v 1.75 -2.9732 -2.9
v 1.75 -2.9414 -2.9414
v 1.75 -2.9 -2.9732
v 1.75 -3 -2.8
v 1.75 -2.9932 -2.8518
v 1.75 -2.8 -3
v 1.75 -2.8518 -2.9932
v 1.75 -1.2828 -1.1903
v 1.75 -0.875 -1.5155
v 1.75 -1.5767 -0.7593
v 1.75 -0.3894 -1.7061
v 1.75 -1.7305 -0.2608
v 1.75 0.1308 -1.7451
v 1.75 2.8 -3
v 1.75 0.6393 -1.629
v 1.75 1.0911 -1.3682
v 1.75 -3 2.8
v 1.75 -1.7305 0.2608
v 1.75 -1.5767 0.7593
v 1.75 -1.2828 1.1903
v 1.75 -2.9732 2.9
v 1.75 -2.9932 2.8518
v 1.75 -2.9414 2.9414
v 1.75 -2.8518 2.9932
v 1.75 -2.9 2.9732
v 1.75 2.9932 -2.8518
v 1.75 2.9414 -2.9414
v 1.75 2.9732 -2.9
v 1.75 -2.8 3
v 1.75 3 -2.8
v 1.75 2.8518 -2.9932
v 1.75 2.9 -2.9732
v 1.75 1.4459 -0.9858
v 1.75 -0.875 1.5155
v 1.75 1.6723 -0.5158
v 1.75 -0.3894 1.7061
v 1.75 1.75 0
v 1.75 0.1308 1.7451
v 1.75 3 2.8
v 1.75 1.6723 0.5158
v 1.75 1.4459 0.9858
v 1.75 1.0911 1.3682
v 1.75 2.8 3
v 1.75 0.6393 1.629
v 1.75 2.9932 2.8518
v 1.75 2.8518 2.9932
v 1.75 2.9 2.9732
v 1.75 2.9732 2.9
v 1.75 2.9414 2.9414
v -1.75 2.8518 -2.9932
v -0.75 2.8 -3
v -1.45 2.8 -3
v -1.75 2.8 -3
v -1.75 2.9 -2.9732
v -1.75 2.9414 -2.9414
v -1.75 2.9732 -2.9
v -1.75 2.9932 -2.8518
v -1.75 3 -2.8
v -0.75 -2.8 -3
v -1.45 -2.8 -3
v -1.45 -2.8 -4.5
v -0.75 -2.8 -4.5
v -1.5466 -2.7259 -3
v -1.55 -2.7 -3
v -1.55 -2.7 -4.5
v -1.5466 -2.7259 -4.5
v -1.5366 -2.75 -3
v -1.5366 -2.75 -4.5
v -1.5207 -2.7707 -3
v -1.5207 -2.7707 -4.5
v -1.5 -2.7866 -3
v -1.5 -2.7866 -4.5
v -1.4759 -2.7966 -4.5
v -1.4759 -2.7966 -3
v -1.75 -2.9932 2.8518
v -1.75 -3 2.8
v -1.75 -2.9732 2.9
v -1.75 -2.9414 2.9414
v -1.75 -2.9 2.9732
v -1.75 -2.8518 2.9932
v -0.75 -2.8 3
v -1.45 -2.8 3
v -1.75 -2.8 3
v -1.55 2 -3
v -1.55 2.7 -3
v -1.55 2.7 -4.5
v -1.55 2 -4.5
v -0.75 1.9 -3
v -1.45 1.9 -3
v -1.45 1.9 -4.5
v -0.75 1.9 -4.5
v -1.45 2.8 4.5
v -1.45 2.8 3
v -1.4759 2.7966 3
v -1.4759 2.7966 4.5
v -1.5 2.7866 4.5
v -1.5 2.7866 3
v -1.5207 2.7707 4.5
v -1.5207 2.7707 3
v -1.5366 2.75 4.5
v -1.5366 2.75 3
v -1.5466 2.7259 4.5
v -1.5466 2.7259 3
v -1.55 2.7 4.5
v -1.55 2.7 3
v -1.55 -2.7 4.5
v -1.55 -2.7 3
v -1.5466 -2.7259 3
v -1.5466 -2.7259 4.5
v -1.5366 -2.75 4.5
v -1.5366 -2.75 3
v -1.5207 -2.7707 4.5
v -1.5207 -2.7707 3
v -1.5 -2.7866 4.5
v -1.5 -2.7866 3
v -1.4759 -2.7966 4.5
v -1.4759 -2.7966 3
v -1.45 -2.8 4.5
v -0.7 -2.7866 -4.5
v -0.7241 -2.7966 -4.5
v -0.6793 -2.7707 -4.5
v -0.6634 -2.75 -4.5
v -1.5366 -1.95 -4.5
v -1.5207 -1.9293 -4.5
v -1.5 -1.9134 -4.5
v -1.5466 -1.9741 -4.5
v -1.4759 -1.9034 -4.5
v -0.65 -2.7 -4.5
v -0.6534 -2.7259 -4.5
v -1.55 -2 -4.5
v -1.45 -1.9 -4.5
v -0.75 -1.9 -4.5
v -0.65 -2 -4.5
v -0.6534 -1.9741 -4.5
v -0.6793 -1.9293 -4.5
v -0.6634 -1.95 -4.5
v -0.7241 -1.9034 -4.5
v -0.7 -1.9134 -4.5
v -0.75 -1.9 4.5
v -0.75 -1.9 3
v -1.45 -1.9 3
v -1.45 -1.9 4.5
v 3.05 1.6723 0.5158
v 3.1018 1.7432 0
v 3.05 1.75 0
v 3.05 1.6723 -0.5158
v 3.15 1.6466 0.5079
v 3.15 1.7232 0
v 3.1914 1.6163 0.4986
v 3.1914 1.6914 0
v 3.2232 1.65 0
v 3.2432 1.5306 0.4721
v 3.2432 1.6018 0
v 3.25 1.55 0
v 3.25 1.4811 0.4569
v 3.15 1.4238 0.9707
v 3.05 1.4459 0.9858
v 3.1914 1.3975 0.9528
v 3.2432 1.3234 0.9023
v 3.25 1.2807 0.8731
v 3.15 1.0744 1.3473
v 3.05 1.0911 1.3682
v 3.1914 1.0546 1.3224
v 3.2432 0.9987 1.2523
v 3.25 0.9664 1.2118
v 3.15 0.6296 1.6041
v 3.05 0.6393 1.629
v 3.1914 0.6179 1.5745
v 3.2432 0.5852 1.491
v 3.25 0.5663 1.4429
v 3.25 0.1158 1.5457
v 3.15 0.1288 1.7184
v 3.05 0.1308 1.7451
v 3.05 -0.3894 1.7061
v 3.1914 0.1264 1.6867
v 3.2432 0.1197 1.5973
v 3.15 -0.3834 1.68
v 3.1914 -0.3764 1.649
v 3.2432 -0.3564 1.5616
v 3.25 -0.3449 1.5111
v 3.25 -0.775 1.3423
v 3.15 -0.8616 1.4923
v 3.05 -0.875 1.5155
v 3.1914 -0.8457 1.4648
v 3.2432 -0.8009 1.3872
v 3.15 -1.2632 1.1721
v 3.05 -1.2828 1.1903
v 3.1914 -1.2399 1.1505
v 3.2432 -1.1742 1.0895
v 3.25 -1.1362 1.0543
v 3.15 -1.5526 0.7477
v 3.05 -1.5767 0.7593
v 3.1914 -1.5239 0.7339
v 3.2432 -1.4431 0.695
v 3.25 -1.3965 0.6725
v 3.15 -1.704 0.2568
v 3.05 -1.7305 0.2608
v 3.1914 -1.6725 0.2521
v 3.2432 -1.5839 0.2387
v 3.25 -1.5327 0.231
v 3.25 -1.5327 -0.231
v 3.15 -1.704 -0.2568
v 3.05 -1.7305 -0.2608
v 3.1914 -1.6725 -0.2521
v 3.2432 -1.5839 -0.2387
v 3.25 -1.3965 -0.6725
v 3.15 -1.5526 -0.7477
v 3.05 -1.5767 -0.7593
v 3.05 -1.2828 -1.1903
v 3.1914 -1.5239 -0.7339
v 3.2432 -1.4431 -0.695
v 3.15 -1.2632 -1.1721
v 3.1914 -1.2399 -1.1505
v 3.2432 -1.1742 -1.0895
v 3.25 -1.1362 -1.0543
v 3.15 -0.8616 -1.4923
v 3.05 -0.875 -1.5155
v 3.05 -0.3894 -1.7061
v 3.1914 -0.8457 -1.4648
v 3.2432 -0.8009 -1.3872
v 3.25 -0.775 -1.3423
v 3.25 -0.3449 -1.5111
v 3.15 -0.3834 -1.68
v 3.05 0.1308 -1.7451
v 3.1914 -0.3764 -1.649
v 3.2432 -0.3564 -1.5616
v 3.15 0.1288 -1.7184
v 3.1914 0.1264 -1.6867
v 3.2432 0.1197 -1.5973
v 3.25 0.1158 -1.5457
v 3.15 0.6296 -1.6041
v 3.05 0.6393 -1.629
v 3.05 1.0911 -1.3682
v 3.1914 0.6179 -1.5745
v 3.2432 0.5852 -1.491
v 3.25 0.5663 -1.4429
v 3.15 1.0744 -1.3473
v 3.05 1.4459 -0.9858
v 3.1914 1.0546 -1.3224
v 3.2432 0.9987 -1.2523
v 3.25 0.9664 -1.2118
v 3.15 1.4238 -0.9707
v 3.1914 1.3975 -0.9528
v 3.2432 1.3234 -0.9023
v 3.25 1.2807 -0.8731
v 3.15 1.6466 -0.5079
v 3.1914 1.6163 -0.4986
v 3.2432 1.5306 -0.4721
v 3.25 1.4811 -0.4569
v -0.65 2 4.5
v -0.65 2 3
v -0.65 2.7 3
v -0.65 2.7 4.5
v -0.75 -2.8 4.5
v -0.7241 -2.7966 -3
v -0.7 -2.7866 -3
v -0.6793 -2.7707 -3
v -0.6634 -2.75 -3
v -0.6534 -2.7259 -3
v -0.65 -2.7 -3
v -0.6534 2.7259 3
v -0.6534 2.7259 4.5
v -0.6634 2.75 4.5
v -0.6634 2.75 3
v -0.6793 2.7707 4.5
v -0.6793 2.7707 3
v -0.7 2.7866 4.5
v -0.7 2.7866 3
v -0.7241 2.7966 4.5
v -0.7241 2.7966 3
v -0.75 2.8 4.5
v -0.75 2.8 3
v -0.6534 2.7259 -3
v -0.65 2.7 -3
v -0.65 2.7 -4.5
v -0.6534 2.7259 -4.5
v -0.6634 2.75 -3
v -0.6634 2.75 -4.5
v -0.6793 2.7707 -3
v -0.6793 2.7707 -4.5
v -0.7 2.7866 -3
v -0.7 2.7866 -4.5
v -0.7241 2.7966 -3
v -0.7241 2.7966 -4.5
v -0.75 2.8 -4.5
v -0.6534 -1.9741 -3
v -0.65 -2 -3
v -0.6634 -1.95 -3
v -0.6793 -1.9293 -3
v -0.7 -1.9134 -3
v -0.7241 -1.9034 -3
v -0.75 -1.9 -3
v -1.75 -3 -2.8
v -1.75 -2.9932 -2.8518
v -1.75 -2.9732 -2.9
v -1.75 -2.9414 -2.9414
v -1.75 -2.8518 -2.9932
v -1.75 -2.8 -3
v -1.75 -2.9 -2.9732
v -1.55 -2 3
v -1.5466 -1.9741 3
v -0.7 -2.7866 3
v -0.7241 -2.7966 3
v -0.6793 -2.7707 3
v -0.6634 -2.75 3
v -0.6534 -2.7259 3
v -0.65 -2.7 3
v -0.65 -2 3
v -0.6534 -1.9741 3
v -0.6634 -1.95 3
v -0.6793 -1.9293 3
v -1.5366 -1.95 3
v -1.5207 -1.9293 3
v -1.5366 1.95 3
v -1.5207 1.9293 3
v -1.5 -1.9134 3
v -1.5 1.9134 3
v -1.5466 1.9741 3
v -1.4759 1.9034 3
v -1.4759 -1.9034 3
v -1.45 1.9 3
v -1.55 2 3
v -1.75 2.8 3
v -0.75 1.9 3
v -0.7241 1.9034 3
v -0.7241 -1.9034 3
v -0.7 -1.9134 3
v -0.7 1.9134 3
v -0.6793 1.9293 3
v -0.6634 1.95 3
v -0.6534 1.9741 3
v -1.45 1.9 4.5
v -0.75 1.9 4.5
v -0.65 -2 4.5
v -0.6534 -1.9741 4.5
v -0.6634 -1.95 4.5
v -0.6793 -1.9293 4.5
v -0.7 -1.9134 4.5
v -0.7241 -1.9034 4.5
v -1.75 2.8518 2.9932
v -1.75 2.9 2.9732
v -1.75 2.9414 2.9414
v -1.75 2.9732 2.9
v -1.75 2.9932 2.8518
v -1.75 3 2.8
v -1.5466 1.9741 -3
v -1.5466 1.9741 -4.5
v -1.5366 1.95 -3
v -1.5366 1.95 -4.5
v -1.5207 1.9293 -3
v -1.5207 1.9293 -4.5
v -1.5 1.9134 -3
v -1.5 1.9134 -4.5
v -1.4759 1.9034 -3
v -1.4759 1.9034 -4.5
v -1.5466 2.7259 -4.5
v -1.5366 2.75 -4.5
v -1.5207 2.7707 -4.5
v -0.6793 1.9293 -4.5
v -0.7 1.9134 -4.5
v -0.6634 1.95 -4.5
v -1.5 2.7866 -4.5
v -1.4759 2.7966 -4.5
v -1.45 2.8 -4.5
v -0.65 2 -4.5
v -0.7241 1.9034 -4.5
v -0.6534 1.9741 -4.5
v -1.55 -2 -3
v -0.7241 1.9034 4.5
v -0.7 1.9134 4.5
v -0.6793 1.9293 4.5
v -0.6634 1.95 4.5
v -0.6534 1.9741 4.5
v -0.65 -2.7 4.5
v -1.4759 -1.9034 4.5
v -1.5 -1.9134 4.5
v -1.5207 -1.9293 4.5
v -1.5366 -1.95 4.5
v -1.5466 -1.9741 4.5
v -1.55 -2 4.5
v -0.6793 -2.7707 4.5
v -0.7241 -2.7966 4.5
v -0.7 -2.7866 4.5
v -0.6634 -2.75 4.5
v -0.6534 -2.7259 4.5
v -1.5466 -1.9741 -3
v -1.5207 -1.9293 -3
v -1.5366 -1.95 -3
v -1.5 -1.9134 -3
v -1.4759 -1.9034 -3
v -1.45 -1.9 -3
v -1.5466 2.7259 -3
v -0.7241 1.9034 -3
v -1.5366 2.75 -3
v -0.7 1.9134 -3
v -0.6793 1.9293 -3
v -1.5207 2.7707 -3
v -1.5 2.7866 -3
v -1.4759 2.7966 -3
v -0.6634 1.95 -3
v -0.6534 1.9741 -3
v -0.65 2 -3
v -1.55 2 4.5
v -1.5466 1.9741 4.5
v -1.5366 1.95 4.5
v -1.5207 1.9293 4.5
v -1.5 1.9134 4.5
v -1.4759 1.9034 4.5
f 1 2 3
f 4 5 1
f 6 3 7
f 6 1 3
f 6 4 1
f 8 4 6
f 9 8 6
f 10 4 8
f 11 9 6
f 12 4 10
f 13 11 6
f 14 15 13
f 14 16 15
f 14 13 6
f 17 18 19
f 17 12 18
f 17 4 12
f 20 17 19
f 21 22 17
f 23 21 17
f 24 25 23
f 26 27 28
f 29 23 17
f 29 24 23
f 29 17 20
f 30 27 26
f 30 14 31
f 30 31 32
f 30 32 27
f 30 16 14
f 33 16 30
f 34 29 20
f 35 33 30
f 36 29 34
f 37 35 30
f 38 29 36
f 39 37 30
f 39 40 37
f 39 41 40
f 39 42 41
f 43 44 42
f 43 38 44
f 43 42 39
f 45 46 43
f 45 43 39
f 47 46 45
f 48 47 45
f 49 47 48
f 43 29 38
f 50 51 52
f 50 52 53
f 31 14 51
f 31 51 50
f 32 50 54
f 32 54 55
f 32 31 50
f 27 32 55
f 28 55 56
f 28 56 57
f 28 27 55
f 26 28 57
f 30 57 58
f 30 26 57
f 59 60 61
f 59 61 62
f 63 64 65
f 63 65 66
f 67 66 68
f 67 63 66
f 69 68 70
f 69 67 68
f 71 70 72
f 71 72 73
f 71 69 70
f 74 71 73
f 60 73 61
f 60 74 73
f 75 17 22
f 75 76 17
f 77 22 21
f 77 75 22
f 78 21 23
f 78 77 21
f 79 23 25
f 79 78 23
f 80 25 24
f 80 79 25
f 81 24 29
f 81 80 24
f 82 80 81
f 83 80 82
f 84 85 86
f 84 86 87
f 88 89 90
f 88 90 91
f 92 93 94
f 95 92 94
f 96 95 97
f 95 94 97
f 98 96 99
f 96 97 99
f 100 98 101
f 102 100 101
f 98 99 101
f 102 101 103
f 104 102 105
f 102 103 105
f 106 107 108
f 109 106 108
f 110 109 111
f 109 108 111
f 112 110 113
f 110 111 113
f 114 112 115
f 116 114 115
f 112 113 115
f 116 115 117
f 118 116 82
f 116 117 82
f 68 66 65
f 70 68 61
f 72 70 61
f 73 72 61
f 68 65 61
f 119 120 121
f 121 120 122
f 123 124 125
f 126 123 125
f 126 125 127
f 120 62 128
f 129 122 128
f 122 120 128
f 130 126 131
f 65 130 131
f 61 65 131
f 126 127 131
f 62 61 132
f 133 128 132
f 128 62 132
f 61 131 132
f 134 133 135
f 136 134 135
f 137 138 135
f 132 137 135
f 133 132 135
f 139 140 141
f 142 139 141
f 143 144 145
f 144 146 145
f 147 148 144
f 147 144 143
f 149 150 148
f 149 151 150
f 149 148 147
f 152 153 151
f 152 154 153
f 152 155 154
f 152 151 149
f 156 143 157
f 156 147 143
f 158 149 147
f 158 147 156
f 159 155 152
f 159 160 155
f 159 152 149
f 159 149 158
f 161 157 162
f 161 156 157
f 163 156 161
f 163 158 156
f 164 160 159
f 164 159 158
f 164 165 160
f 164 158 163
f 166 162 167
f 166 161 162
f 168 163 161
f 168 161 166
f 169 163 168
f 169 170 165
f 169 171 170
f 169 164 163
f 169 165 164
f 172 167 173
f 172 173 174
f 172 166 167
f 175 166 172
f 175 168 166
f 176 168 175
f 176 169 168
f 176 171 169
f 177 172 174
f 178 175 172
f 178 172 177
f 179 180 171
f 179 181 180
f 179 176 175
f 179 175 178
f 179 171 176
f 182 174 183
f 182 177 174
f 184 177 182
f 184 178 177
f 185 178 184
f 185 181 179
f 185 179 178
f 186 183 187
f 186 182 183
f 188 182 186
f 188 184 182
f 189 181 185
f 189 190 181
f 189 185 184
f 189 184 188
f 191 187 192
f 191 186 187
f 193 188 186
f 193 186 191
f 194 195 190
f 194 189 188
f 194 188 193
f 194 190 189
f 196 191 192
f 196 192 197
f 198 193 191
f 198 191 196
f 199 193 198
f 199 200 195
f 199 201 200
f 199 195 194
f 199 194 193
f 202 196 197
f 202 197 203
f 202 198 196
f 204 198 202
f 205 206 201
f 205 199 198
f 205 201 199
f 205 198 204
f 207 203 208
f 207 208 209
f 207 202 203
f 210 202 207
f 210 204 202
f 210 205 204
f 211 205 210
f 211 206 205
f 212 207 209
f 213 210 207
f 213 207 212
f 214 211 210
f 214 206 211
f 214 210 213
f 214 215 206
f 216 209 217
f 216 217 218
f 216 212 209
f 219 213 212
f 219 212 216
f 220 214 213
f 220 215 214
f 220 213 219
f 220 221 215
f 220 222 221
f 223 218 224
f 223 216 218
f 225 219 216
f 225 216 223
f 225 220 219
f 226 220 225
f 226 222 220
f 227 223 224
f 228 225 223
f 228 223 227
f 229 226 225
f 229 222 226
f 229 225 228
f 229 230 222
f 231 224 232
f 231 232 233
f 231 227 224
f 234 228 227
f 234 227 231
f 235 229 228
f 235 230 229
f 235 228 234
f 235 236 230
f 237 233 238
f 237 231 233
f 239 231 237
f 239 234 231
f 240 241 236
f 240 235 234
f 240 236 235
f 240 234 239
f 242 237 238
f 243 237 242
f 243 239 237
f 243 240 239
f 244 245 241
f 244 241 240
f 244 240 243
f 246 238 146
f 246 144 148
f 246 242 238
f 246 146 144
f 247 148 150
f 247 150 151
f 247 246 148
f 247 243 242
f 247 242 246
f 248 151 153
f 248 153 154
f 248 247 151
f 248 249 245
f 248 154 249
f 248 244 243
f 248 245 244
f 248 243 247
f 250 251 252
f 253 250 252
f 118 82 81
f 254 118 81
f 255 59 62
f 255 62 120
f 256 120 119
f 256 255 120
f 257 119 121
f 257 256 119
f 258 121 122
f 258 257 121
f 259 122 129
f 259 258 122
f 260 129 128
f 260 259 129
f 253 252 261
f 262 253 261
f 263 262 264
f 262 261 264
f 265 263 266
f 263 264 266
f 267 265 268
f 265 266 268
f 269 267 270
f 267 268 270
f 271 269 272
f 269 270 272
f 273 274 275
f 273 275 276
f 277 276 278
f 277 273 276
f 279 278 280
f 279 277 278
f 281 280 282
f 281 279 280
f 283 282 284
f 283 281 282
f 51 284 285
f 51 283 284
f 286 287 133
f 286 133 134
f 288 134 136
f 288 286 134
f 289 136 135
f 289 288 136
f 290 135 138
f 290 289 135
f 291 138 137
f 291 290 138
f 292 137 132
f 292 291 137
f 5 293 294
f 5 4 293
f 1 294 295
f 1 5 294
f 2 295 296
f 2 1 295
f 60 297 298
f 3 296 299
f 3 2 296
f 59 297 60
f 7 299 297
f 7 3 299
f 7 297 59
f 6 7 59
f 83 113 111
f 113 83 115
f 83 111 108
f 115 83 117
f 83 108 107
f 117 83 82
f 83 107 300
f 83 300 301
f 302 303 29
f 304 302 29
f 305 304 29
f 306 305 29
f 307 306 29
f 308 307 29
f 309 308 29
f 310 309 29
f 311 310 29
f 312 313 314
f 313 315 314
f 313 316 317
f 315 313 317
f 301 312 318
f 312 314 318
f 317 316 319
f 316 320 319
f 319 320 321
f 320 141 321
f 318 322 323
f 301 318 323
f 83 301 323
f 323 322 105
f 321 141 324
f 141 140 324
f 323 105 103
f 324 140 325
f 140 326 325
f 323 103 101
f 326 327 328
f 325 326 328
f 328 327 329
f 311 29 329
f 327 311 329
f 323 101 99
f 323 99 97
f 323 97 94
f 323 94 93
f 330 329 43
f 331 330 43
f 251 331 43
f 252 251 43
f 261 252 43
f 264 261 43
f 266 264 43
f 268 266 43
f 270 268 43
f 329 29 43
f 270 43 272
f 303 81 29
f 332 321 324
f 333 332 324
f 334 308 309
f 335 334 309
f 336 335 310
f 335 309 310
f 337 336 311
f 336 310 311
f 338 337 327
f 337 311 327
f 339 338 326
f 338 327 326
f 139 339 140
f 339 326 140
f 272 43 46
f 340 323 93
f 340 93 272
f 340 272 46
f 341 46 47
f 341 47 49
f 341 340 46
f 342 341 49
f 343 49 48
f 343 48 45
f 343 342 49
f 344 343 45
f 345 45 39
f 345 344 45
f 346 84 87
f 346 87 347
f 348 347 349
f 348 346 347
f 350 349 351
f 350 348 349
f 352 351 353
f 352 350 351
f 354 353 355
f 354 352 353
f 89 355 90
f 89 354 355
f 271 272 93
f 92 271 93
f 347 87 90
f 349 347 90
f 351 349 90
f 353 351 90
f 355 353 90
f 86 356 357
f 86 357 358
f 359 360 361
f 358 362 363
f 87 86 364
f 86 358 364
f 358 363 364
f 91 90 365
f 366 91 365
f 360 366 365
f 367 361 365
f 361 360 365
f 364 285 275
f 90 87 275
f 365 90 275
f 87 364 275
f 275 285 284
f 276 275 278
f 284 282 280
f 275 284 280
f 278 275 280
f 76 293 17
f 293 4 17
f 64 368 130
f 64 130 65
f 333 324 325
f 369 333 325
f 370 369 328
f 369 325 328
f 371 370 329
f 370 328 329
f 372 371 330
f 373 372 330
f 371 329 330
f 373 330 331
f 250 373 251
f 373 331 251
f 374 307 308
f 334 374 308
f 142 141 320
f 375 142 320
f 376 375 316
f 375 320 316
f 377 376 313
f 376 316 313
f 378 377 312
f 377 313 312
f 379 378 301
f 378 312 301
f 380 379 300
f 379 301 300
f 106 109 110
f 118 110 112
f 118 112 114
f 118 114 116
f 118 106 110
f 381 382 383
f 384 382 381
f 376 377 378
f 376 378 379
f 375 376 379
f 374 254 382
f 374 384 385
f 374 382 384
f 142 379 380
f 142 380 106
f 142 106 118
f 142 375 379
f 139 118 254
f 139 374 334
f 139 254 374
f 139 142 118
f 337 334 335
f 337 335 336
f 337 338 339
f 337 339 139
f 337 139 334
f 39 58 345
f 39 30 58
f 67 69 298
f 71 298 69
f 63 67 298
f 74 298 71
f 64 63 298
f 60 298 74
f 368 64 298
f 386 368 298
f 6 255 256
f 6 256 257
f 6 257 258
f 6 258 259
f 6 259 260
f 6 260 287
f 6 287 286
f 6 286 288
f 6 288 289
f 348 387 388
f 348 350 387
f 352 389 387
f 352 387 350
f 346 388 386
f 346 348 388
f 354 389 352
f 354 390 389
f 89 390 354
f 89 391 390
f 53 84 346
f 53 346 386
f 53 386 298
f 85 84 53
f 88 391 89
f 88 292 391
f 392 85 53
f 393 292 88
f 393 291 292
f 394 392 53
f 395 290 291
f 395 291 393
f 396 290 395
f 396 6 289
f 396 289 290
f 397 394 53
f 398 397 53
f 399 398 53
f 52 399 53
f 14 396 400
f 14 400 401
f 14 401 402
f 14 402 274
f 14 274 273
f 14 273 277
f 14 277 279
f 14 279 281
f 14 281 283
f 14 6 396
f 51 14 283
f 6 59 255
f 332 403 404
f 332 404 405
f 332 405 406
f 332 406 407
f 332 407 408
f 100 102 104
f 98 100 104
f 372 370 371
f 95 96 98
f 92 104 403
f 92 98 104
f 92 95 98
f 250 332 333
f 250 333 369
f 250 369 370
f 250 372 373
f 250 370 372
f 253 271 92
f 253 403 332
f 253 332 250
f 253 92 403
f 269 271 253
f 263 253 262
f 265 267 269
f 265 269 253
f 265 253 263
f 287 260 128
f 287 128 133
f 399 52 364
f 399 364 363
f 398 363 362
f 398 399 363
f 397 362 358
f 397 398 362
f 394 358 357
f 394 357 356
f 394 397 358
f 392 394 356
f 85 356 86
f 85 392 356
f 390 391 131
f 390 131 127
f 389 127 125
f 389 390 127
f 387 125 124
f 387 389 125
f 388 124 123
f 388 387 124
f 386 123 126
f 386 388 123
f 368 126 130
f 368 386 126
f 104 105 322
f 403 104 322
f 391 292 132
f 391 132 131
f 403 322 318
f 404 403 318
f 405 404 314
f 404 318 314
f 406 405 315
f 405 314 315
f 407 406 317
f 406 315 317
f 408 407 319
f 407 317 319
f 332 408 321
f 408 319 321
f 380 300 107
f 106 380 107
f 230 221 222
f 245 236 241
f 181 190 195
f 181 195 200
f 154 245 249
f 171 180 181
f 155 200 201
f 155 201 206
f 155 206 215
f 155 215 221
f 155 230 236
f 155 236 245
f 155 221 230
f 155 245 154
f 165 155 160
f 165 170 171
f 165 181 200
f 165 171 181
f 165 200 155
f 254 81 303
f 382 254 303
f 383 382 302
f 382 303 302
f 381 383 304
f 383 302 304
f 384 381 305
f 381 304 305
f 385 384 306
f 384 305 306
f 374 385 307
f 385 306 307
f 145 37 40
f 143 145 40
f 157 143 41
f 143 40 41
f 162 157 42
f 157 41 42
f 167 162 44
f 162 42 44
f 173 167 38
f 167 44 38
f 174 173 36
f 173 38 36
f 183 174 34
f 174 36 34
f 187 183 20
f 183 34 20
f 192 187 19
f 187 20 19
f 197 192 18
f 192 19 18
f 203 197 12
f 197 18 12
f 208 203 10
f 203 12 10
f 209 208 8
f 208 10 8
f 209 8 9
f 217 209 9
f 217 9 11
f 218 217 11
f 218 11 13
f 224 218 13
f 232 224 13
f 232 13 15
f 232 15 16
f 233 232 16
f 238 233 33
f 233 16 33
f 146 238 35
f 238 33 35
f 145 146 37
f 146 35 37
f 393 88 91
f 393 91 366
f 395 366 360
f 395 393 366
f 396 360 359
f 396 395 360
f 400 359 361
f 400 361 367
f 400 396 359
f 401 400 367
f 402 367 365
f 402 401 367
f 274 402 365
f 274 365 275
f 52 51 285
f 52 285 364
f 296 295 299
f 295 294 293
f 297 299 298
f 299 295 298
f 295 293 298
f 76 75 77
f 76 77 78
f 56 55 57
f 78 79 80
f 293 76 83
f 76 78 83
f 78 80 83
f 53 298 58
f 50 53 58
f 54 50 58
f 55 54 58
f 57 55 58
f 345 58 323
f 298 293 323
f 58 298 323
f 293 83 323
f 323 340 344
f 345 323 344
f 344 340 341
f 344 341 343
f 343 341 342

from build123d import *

# Parameters (mm, degrees)
F0_W     = 6
F0_H     = 6
F1_DEPTH = 1.75
F2_R     = 1.75
F3_DEPTH = 1.5
F4_R     = 0.2
F6_DEPTH = 1.5


# Not quite as in the source:
# - a pattern or mirror of a feature is missing from the dataset's text; its kind, count and spacing are read off the source's solid


with BuildPart() as f1:
    # F0 (on Right) → F1 (new body, symmetric)
    with BuildSketch(Plane.YZ):
        Rectangle(F0_W, F0_H)
    extrude(amount=F1_DEPTH, both=True)

    # F2 (on face) → F3 (join)
    with BuildSketch(Plane.YZ.offset(1.75)):
        Circle(F2_R)
    extrude(amount=F3_DEPTH)

    # F4
    f4_edges = [f1.edges().sort_by_distance(p)[0] for p in [
        (3.25, -1.75, 0),
        (0, -3, 3),
        (0, 3, 3),
        (0, 3, -3),
        (0, -3, -3),
    ]]
    fillet(f4_edges, radius=F4_R)

    # F5 (on face) → F6 (join)
    with BuildSketch(Plane.XY.offset(3)):
        with BuildLine():
            ThreePointArc((-1.55, -2.7), (-1.5207106781, -2.7707106781), (-1.45, -2.8))
            Line((-1.45, -2.8), (-0.75, -2.8))
            ThreePointArc((-0.75, -2.8), (-0.6792893219, -2.7707106781), (-0.65, -2.7))
            Line((-0.65, -2.7), (-0.65, -2))
            ThreePointArc((-0.65, -2), (-0.6792893219, -1.9292893219), (-0.75, -1.9))
            Line((-0.75, -1.9), (-1.45, -1.9))
            ThreePointArc((-1.45, -1.9), (-1.5207106781, -1.9292893219), (-1.55, -2))
            Line((-1.55, -2), (-1.55, -2.7))
        make_face()
        with BuildLine():
            ThreePointArc((-0.65, 2.7), (-0.6792893219, 2.7707106781), (-0.75, 2.8))
            Line((-0.75, 2.8), (-1.45, 2.8))
            ThreePointArc((-1.45, 2.8), (-1.5207106781, 2.7707106781), (-1.55, 2.7))
            Line((-1.55, 2.7), (-1.55, 2))
            ThreePointArc((-1.55, 2), (-1.5207106781, 1.9292893219), (-1.45, 1.9))
            Line((-1.45, 1.9), (-0.75, 1.9))
            ThreePointArc((-0.75, 1.9), (-0.6792893219, 1.9292893219), (-0.65, 2))
            Line((-0.65, 2), (-0.65, 2.7))
        make_face()
    f6 = extrude(amount=F6_DEPTH)

    # F6_copies: F6 across plane
    add(f6.mirror(Plane(origin=(0, 0, 0), x_dir=(-1, 0, 0), z_dir=(0, 0, -1))))


solid = f1.part
